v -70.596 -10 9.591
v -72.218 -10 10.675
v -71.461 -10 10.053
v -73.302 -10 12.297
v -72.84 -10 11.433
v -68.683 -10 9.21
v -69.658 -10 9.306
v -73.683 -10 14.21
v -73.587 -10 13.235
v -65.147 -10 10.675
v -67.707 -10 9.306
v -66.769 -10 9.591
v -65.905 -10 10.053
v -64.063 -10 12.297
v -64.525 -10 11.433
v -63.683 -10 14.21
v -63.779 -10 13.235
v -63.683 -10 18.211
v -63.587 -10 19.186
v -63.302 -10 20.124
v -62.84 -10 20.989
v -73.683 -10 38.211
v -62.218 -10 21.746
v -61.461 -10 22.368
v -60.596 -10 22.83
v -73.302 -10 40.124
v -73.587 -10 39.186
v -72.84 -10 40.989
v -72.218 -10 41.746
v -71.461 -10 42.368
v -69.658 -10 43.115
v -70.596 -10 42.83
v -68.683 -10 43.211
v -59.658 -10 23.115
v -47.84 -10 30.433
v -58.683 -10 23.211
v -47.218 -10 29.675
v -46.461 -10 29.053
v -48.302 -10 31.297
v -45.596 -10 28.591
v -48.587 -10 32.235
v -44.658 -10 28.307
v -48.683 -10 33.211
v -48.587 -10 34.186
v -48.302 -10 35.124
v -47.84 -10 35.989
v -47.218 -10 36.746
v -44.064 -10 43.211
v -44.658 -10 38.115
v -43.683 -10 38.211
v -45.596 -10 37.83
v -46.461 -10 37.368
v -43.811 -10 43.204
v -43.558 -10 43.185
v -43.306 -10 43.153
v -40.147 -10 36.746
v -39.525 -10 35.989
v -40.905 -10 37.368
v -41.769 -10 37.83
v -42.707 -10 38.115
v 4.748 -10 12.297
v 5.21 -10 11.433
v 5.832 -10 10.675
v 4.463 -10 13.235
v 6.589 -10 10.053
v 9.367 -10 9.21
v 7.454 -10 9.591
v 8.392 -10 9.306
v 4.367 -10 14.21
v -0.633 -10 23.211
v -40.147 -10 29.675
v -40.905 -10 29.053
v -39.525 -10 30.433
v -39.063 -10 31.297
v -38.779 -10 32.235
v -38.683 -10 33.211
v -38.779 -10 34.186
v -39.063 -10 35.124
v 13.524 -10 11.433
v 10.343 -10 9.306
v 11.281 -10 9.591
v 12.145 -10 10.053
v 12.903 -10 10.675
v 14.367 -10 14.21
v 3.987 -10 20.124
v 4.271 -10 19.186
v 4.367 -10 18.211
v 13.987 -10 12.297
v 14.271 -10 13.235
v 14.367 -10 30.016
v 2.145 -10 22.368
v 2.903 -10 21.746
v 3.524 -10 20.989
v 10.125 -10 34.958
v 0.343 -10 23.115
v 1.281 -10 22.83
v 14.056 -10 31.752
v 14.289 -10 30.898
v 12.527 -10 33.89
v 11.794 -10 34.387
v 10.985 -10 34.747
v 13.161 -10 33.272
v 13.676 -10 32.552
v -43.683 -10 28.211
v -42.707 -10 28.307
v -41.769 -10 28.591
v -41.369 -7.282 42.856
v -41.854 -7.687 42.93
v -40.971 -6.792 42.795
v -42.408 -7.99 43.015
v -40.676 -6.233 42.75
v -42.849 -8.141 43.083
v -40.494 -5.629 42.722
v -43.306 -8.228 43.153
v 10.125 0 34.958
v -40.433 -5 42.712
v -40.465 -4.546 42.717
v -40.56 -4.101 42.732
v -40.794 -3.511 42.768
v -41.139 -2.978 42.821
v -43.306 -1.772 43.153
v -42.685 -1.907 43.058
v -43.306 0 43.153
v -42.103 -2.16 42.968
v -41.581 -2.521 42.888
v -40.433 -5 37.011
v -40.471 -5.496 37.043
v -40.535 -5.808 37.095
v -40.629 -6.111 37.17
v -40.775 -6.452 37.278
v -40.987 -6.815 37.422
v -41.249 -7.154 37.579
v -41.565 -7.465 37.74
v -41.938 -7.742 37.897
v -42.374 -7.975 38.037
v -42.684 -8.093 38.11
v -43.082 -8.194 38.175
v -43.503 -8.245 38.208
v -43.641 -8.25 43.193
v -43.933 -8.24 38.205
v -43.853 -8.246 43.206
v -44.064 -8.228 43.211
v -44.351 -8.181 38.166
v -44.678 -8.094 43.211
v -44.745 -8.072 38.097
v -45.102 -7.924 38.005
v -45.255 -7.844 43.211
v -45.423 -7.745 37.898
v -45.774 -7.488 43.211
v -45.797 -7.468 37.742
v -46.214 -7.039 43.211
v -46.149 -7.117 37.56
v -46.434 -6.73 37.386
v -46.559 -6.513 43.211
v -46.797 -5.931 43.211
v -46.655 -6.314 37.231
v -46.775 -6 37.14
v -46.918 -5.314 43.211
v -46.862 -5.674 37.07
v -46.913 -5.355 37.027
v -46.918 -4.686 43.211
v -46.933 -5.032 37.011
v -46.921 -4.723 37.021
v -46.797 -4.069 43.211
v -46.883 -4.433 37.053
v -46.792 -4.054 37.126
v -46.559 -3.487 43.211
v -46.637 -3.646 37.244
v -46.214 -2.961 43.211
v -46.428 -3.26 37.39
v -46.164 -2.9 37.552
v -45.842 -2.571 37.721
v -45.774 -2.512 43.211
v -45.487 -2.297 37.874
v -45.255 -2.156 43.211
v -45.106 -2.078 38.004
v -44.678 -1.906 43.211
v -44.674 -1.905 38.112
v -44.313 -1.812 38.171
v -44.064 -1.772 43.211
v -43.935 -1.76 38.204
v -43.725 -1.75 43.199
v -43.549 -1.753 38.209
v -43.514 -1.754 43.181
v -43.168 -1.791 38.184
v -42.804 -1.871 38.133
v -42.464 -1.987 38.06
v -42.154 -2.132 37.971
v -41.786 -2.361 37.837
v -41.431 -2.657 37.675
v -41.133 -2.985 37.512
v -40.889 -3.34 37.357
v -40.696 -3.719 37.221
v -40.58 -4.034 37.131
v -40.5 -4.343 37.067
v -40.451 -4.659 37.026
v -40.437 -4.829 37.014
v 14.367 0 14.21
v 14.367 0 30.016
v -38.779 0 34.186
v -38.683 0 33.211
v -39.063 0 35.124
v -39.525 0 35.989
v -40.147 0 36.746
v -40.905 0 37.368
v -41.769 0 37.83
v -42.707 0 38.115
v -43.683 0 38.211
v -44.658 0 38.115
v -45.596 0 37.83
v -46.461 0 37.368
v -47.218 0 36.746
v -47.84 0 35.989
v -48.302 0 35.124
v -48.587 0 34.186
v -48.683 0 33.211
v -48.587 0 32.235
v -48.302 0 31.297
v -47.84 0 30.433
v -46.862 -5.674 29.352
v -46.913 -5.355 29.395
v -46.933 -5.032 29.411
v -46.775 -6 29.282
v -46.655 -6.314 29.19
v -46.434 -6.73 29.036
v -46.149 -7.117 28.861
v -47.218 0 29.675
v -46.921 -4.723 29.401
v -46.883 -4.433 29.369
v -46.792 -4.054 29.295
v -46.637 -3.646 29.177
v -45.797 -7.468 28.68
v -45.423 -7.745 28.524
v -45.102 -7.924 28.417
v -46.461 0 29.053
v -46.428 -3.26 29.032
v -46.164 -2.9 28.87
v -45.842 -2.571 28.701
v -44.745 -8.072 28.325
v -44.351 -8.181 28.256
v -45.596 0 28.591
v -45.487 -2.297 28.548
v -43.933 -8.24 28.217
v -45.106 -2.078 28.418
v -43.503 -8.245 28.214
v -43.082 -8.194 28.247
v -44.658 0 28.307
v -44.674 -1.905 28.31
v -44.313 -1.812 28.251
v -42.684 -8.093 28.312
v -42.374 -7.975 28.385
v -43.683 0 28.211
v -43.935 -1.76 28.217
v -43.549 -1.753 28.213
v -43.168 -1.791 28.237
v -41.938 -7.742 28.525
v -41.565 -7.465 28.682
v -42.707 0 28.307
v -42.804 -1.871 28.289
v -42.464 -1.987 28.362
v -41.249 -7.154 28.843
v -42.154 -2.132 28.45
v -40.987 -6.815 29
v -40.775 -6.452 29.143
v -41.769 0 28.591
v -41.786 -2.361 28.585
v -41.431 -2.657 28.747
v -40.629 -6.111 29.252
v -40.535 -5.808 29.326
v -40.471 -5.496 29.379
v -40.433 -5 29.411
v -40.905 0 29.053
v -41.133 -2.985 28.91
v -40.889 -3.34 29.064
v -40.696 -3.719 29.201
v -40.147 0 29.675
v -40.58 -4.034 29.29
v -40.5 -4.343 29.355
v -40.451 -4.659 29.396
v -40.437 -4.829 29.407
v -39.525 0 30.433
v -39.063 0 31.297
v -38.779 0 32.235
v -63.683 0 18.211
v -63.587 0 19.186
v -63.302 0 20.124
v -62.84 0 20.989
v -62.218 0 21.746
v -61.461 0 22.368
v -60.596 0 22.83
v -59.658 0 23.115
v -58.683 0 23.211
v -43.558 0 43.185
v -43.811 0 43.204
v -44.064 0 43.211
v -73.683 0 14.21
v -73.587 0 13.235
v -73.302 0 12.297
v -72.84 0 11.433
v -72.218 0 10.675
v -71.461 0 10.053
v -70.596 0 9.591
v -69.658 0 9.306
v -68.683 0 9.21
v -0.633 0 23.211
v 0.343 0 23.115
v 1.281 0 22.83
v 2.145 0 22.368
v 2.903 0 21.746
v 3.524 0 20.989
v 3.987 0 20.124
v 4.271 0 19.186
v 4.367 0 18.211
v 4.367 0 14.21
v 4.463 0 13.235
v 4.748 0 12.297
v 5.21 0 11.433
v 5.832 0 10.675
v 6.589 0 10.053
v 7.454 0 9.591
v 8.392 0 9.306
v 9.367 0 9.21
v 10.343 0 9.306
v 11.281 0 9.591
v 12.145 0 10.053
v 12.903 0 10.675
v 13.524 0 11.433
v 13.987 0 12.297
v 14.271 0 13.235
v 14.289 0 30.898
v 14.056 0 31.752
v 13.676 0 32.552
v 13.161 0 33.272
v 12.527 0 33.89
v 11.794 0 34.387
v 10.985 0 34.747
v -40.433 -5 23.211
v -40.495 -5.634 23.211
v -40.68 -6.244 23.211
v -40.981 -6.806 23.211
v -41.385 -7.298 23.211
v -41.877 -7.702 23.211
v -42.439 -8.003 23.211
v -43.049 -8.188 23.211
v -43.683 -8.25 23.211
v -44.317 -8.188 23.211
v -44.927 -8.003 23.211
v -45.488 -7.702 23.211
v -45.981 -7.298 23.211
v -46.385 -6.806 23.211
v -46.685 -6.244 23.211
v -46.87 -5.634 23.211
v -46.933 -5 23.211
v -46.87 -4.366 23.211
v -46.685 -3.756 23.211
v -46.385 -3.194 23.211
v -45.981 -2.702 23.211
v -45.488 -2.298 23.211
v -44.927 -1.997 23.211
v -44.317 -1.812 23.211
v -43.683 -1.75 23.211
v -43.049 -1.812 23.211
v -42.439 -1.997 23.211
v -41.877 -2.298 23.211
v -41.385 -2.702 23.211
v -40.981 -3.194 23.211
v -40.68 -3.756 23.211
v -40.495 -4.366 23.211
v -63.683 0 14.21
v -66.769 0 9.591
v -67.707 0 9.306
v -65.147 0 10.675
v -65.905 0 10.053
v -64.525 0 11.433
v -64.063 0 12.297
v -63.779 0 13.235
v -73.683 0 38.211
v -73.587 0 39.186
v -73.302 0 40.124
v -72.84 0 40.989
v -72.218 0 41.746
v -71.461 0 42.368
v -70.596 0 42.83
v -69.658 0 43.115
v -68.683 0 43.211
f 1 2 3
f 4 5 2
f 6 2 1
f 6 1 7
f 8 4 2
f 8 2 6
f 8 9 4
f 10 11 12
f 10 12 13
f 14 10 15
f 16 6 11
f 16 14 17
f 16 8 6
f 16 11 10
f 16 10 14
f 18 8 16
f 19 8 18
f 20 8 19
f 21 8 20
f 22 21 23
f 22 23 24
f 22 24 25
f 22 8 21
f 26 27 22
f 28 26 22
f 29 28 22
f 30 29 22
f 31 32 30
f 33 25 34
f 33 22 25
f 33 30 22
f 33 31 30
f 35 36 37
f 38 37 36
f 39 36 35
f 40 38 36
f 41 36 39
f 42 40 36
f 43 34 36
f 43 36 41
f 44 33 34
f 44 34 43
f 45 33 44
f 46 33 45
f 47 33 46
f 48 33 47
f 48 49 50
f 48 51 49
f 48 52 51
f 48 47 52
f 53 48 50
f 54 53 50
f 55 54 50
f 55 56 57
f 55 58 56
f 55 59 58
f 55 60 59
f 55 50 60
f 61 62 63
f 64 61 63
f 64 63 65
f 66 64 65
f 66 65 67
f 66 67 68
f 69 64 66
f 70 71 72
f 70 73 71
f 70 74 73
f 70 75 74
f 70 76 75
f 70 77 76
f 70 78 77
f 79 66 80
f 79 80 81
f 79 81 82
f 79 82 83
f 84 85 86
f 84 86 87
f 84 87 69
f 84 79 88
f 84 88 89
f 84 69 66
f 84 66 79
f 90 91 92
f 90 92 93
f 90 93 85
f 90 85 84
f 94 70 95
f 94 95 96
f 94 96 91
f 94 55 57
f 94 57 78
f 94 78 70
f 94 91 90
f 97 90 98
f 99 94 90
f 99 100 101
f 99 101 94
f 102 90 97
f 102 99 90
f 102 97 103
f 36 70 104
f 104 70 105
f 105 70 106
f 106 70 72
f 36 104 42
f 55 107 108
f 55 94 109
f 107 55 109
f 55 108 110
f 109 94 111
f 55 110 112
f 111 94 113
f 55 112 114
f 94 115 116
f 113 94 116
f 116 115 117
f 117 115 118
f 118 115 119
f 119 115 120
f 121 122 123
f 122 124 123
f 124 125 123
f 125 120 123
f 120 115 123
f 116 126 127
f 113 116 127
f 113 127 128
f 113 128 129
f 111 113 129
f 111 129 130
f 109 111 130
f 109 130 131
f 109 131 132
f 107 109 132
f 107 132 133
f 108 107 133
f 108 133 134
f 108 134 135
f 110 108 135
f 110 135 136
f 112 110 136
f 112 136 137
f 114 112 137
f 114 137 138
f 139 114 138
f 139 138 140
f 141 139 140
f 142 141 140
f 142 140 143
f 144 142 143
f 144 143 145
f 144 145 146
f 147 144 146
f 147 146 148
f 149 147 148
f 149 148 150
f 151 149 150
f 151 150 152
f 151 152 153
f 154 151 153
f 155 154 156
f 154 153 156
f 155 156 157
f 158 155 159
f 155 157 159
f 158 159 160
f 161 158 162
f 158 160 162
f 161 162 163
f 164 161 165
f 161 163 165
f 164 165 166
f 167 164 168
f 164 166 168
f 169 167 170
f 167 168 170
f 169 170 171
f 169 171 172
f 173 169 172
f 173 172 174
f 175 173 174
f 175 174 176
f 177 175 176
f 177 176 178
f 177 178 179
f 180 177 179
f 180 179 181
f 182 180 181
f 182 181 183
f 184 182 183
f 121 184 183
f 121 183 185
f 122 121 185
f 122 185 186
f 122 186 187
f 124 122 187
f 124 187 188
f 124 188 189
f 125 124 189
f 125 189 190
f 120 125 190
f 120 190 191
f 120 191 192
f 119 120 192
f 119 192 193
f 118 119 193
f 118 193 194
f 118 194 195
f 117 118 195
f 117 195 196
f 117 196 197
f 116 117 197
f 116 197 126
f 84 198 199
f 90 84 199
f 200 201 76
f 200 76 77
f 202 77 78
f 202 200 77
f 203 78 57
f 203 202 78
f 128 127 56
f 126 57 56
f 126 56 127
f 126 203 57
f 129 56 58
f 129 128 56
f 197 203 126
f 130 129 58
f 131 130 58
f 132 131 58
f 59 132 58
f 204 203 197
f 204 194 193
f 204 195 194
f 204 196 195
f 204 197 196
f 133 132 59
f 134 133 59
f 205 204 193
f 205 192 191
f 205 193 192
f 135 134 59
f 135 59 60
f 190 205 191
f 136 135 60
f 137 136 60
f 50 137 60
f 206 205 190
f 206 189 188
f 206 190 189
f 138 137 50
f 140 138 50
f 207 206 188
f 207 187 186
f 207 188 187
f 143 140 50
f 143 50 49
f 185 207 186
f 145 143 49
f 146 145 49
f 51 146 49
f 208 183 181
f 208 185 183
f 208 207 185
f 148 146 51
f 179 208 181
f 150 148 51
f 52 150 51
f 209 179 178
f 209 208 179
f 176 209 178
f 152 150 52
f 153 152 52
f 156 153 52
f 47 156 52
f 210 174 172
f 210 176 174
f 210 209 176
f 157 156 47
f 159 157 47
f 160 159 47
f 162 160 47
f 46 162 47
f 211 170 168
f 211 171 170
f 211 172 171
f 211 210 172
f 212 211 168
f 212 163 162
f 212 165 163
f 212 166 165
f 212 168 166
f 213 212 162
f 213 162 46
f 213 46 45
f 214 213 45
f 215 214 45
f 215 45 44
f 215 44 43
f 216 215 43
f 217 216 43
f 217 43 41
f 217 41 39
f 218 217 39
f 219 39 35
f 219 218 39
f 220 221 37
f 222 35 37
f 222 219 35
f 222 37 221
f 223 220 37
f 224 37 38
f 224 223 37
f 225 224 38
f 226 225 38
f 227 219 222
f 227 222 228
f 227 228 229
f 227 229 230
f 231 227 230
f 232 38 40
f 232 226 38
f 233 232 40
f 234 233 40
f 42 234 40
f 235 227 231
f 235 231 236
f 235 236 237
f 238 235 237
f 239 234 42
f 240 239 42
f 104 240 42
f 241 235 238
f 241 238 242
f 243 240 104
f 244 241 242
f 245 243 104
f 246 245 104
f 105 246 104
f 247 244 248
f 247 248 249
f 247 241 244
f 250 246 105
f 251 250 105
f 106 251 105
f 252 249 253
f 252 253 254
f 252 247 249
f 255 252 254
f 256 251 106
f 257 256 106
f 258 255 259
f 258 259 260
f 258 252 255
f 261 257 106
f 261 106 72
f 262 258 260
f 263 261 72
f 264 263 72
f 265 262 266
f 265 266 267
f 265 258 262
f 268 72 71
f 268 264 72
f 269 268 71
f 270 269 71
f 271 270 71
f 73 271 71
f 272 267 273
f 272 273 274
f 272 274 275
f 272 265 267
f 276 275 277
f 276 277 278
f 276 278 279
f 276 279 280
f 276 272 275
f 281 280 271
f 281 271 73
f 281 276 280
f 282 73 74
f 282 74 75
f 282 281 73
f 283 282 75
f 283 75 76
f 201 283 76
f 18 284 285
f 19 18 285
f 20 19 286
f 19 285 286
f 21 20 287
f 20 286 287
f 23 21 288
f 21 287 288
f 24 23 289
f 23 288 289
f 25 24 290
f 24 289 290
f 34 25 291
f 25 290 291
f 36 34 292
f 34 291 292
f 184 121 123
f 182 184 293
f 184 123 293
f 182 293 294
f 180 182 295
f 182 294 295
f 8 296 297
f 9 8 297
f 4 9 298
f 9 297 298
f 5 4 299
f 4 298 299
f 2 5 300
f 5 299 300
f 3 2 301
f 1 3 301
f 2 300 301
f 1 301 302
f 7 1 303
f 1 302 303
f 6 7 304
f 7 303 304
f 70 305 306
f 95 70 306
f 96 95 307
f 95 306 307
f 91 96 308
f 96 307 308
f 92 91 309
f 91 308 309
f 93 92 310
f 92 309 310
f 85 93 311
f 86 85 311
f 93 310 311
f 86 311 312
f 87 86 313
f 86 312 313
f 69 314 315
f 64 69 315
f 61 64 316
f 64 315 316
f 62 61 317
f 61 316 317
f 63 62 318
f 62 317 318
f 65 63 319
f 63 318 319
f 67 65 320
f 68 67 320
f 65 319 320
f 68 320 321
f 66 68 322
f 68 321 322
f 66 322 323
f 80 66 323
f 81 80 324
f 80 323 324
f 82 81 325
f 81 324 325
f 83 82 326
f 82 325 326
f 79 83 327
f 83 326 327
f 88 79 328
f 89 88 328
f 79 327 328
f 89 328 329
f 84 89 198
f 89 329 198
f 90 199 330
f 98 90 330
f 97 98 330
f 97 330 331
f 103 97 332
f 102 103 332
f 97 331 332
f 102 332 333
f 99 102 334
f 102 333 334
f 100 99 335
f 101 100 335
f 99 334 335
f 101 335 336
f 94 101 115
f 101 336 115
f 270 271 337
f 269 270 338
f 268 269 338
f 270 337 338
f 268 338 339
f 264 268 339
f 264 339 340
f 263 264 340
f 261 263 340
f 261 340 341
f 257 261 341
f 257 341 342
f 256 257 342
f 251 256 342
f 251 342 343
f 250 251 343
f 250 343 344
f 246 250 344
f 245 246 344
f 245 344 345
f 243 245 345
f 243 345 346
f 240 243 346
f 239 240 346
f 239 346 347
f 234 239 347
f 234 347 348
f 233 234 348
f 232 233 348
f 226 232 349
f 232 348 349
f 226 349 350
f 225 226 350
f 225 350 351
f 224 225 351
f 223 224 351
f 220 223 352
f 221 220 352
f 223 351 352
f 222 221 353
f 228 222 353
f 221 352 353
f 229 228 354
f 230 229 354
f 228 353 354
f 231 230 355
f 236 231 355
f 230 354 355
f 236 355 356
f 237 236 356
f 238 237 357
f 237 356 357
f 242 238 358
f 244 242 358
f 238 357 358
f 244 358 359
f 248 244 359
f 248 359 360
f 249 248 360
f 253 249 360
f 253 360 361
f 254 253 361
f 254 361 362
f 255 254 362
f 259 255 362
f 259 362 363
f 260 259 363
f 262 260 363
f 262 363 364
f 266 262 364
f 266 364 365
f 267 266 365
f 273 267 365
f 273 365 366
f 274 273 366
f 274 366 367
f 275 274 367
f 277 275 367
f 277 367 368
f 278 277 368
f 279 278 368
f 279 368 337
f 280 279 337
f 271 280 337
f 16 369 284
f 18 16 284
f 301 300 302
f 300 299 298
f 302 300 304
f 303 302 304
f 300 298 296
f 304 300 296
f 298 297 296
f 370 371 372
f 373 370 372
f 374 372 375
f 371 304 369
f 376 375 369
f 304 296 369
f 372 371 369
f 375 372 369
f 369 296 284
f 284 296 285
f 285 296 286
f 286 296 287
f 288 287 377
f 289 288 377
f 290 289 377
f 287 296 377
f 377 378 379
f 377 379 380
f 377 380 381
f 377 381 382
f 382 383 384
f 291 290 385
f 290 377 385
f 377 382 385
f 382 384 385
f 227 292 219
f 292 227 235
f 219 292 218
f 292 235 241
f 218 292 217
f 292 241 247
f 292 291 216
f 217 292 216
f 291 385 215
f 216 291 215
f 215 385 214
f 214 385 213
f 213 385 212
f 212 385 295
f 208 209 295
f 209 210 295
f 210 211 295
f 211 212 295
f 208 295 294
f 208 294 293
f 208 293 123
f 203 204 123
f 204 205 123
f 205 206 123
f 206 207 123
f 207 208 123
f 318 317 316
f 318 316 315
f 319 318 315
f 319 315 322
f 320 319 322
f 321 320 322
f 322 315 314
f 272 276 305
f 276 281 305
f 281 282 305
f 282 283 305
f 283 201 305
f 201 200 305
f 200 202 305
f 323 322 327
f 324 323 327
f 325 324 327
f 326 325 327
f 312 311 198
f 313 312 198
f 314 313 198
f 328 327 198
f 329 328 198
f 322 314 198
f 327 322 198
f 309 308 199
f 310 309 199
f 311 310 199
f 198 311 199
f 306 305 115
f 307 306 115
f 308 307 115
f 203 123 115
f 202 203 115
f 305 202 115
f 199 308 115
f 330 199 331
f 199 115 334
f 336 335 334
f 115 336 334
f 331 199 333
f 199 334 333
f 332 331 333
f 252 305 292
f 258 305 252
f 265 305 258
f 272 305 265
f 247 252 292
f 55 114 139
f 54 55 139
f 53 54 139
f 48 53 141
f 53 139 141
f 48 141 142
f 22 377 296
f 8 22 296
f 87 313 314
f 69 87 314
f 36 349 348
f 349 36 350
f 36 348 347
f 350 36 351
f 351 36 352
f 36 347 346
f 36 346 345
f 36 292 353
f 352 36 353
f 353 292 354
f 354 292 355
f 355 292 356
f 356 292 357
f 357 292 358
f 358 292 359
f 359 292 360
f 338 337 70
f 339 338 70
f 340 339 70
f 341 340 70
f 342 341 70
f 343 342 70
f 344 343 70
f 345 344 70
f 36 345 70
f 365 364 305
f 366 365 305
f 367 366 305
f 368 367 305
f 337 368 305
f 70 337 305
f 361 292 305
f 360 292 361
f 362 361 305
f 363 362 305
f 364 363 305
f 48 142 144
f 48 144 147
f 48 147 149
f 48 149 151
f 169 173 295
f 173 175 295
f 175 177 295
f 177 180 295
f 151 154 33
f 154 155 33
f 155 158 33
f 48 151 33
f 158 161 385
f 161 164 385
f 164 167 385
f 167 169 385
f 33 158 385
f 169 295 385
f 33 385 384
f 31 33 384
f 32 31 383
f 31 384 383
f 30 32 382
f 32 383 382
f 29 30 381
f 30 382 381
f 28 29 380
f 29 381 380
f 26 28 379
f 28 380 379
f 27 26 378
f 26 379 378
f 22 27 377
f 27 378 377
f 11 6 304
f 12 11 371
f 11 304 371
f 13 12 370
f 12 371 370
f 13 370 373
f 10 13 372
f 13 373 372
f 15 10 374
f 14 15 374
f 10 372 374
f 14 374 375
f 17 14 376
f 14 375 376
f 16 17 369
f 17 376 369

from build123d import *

# Parameters (mm, degrees)
F0_R     = 5
F1_DEPTH = 10
F2_R     = 3.25
F3_DEPTH = 20.001


with BuildPart() as f1:
    # F0 (on Front) → F1 (new body)
    with BuildSketch(Plane.XZ):
        with BuildLine():
            ThreePointArc((-68.682837, 9.210357), (-65.147303, 10.674823), (-63.682837, 14.210357))
            Line((-63.682837, 14.210357), (-63.682837, 18.210842))
            ThreePointArc((-63.682837, 18.210842), (-62.218371, 21.746376), (-58.682837, 23.210842))
            Line((-58.682837, 23.210842), (-0.632853, 23.210842))
            ThreePointArc((-0.632853, 23.210842), (2.902681, 21.746376), (4.367147, 18.210842))
            Line((4.367147, 18.210842), (4.367147, 14.210357))
            ThreePointArc((4.367147, 14.210357), (5.831613, 10.674823), (9.367147, 9.210357))
            ThreePointArc((9.367147, 9.210357), (12.902681, 10.674823), (14.367147, 14.210357))
            Line((14.367147, 14.210357), (14.367147, 30.015659))
            ThreePointArc((14.367147, 30.015659), (13.16123, 33.27218), (10.125174, 34.957864))
            Line((10.125174, 34.957864), (-43.306027, 43.153047))
            ThreePointArc((-43.306027, 43.153047), (-43.68394, 43.196372), (-44.064054, 43.210842))
            Line((-44.064054, 43.210842), (-68.682837, 43.210842))
            ThreePointArc((-68.682837, 43.210842), (-72.218371, 41.746376), (-73.682837, 38.210842))
            Line((-73.682837, 38.210842), (-73.682837, 14.210357))
            ThreePointArc((-73.682837, 14.210357), (-72.218371, 10.674823), (-68.682837, 9.210357))
        make_face()
        with Locations((-43.682837, 33.210842)):
            Circle(F0_R, mode=Mode.SUBTRACT)
    extrude(amount=F1_DEPTH)

    # F2 (on face) → F3 (cut, through all)
    with BuildSketch(Plane(origin=(0, 0, 23.210842), x_dir=(1, 0, 0), z_dir=(0, 0, -1))):
        with Locations((-43.682837, 5)):
            Circle(F2_R)
    extrude(amount=-F3_DEPTH, mode=Mode.SUBTRACT)


solid = f1.part
